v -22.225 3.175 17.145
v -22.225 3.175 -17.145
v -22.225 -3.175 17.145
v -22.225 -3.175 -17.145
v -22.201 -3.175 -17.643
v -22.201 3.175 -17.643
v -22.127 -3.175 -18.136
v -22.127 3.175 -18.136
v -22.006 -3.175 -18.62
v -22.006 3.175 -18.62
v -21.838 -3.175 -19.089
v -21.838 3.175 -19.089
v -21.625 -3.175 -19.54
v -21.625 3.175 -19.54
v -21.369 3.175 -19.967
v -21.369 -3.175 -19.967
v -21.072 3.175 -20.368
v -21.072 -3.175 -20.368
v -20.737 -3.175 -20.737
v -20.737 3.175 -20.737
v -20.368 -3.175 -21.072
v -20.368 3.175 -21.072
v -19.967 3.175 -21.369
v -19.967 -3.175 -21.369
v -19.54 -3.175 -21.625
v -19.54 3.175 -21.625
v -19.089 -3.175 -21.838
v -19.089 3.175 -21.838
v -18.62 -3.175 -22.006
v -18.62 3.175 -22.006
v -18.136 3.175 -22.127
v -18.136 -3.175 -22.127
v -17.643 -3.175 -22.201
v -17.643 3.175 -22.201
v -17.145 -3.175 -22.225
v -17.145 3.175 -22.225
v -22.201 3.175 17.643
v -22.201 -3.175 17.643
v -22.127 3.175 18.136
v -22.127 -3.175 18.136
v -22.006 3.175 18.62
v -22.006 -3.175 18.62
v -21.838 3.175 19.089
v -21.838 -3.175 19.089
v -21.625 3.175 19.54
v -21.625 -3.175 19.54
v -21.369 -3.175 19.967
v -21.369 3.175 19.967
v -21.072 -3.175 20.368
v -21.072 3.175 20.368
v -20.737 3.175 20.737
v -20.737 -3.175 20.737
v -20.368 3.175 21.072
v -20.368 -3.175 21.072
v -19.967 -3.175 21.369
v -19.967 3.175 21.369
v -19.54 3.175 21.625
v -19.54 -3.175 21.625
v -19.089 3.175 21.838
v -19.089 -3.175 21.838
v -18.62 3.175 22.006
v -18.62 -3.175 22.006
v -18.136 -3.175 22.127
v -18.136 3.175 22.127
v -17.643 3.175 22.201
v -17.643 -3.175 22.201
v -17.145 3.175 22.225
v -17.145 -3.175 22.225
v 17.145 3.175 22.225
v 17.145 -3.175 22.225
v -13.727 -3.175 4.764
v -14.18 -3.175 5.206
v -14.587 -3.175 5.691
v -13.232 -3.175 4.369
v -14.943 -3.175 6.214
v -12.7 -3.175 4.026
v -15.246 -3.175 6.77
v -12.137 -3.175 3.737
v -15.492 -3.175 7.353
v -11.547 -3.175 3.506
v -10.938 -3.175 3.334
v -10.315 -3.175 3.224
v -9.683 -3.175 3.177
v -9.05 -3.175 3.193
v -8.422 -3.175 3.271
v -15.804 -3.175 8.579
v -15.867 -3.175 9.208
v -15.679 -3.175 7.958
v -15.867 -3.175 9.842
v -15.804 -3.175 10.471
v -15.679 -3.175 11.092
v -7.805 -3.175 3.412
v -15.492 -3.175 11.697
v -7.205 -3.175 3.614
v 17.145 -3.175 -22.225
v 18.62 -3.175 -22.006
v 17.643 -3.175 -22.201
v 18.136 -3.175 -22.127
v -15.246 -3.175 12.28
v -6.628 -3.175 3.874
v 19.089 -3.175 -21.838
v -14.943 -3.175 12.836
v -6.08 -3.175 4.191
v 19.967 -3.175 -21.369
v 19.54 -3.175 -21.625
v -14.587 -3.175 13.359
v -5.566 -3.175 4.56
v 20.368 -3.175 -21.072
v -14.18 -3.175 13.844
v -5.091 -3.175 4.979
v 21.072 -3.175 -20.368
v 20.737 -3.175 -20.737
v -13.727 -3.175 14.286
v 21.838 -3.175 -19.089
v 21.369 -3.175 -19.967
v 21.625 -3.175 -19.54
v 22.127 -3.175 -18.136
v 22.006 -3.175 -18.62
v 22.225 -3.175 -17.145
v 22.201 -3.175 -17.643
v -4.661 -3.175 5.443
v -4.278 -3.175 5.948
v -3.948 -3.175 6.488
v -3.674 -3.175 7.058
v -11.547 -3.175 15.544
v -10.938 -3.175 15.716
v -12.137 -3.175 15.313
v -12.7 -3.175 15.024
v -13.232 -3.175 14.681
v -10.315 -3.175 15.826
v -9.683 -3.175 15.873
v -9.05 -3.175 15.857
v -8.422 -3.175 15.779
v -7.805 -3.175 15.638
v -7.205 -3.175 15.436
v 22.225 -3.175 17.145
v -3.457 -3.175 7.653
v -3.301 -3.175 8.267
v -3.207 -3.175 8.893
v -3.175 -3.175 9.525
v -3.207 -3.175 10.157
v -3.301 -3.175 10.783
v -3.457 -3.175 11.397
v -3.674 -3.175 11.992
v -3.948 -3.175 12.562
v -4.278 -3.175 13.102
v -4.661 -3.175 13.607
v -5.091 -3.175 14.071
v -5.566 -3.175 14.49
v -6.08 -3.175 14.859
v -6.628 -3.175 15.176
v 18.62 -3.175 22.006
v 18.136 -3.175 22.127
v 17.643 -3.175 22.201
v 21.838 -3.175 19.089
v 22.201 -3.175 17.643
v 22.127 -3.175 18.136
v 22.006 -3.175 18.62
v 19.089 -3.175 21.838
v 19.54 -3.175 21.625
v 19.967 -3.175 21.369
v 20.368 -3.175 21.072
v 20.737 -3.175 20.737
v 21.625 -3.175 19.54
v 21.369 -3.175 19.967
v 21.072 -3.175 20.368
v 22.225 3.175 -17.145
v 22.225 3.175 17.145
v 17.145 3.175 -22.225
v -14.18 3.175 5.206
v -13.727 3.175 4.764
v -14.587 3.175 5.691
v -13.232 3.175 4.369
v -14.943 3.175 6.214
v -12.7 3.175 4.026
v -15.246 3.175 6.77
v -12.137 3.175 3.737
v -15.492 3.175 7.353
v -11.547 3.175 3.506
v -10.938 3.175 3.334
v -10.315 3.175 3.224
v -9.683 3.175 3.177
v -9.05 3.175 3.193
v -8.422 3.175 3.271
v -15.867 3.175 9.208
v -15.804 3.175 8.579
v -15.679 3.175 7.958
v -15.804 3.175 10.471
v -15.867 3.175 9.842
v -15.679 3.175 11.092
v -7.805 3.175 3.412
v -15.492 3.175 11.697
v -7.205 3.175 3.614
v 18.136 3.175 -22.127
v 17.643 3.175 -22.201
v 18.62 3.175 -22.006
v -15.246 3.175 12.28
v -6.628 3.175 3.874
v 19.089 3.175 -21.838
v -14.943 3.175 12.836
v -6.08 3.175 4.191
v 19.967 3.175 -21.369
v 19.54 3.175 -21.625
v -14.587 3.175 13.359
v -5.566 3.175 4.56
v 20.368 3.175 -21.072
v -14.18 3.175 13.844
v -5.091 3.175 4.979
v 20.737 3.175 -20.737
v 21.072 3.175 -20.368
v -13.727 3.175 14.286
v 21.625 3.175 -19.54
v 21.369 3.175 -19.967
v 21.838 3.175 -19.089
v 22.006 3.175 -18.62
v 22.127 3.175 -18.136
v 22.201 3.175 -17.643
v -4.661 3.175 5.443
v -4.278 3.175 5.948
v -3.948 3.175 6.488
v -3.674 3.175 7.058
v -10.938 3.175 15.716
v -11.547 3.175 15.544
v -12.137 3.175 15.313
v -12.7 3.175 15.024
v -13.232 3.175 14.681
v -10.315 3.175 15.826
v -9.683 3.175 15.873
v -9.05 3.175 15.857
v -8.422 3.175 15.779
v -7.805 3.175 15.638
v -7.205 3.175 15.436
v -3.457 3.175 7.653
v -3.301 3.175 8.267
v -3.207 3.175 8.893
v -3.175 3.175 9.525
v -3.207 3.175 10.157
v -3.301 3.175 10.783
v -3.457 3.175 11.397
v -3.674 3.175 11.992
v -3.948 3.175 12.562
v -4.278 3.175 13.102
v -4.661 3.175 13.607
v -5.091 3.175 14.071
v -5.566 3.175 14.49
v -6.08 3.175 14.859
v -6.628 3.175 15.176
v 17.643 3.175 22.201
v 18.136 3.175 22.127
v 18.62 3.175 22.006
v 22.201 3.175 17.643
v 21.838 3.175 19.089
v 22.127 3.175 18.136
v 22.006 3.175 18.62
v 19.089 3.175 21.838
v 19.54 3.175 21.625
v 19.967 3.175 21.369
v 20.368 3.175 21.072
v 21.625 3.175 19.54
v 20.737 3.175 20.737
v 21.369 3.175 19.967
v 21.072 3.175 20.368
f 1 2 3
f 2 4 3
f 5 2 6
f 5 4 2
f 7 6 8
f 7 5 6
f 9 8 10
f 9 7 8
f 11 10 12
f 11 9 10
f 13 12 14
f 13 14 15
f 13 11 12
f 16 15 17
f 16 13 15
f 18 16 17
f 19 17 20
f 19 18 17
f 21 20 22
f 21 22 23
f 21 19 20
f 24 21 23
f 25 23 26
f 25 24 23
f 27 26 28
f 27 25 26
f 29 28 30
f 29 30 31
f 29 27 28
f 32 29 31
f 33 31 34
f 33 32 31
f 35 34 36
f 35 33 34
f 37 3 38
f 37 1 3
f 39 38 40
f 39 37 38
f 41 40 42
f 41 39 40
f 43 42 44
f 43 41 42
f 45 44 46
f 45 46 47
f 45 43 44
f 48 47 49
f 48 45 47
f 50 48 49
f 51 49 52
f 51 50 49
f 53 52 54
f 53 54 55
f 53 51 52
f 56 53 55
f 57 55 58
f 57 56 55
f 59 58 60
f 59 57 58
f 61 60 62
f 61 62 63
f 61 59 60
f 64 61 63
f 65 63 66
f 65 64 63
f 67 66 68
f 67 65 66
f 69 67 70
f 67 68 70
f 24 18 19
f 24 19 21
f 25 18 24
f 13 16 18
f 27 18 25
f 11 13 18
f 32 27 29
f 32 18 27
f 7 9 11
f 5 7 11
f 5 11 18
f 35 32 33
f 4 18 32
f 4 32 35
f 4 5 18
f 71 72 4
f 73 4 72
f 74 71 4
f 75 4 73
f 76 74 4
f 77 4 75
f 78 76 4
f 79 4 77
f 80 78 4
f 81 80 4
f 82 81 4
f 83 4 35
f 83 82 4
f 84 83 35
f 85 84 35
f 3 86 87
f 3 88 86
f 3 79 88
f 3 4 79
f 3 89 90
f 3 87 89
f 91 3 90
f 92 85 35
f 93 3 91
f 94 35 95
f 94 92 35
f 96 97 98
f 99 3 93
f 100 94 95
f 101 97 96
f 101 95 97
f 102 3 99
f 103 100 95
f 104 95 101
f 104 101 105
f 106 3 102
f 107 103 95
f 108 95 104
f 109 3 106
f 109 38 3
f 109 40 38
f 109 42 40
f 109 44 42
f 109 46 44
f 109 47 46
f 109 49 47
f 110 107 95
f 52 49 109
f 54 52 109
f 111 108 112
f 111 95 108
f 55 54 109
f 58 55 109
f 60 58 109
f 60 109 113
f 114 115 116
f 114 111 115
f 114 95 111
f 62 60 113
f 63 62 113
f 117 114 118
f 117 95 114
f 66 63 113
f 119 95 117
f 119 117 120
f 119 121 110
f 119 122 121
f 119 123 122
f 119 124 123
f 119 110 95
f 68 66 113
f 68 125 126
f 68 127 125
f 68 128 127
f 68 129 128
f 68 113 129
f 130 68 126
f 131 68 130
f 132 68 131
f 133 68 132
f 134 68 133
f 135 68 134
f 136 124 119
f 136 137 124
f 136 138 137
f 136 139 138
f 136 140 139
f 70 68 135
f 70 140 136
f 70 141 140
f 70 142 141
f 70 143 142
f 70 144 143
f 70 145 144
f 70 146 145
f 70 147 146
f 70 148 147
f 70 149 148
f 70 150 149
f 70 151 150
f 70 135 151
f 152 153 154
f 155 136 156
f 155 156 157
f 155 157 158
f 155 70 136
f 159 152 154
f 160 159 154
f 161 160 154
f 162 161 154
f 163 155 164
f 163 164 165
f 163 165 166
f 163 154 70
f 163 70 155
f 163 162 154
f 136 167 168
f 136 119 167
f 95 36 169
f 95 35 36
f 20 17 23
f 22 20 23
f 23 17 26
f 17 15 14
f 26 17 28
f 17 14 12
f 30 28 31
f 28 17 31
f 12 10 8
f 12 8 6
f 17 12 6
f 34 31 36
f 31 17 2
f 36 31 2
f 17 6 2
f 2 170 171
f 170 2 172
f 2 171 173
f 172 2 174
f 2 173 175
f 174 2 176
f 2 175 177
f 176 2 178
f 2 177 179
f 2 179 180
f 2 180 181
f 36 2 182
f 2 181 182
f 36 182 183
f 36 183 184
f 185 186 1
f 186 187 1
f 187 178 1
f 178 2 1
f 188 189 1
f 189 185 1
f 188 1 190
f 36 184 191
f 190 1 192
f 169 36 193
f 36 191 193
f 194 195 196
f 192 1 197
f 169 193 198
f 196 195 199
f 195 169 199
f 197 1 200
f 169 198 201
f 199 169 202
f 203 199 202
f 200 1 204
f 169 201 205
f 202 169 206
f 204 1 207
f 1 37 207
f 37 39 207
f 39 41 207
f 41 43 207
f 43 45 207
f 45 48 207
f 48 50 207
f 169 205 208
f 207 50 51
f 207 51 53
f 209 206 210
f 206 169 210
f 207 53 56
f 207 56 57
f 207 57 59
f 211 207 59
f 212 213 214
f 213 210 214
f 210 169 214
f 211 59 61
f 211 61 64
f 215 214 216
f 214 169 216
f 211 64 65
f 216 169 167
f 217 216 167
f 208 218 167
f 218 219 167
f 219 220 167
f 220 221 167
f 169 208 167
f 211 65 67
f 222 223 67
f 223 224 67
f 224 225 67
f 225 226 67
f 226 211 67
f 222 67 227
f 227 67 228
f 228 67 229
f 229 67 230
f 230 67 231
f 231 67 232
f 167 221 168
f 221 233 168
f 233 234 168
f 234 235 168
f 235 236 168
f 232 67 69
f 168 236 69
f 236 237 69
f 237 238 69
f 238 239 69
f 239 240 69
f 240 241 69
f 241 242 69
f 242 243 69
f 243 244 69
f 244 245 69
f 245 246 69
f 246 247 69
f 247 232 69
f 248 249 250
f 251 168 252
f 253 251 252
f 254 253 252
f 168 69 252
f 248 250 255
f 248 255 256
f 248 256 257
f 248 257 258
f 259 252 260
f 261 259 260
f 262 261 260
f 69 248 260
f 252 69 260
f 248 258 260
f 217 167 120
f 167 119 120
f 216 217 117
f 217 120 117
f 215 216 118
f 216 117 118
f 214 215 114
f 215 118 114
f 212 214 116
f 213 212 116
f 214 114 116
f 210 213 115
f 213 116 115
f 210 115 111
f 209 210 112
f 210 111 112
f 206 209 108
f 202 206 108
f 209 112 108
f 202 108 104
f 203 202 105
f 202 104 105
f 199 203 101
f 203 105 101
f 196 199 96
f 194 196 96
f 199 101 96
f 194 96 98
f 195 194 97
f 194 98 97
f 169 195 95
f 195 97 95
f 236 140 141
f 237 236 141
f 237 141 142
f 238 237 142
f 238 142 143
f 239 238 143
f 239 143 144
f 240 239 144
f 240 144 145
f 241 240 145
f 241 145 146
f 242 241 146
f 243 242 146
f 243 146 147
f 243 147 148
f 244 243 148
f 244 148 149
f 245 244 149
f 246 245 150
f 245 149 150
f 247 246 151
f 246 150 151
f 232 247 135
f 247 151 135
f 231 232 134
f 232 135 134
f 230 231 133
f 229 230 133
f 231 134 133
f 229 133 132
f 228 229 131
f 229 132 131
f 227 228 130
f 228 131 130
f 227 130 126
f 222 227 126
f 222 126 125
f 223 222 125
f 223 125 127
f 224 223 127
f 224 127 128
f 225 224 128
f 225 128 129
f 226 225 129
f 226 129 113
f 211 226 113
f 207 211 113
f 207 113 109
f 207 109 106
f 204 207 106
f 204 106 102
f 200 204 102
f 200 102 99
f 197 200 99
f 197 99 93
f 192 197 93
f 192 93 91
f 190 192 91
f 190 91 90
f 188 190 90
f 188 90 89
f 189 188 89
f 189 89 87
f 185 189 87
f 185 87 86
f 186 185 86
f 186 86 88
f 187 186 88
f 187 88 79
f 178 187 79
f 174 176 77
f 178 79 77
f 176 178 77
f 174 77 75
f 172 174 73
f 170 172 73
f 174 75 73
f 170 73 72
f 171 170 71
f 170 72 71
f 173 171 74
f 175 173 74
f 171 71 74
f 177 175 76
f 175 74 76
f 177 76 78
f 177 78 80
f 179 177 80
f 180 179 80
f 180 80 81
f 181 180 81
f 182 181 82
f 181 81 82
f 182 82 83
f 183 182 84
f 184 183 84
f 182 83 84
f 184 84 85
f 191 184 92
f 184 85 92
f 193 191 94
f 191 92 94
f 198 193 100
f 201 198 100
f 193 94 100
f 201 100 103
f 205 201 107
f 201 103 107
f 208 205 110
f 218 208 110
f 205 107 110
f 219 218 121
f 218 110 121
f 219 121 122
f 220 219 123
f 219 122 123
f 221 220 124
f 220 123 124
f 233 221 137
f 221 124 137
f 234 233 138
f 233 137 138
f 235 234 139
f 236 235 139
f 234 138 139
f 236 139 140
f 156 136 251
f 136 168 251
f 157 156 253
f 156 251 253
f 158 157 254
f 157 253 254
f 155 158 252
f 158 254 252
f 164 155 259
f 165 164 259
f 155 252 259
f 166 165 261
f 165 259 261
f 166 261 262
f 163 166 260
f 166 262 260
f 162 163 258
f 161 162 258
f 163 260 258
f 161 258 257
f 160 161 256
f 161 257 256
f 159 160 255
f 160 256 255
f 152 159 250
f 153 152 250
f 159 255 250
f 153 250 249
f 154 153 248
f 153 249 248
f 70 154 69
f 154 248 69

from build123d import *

# Parameters (mm, degrees)
F0_W     = 44.45
F0_H     = 44.45
F1_DEPTH = 3.175
F2_R     = 5.08
F3_R     = 6.35
F4_DEPTH = 6.351


with BuildPart() as f1:
    # F0 (on Front) → F1 (new body, symmetric)
    with BuildSketch(Plane.XZ):
        Rectangle(F0_W, F0_H)
    extrude(amount=F1_DEPTH, both=True)

    # F2
    f2_edges = [f1.edges().sort_by_distance(p)[0] for p in [
        (-22.225, 0, 22.225),
        (22.225, 0, 22.225),
        (22.225, 0, -22.225),
        (-22.225, 0, -22.225),
    ]]
    fillet(f2_edges, radius=F2_R)

    # F3 (on face) → F4 (cut, through all)
    with BuildSketch(Plane.XZ.offset(3.175)):
        with Locations((-9.525, 9.525)):
            Circle(F3_R)
    extrude(amount=-F4_DEPTH, mode=Mode.SUBTRACT)


solid = f1.part
